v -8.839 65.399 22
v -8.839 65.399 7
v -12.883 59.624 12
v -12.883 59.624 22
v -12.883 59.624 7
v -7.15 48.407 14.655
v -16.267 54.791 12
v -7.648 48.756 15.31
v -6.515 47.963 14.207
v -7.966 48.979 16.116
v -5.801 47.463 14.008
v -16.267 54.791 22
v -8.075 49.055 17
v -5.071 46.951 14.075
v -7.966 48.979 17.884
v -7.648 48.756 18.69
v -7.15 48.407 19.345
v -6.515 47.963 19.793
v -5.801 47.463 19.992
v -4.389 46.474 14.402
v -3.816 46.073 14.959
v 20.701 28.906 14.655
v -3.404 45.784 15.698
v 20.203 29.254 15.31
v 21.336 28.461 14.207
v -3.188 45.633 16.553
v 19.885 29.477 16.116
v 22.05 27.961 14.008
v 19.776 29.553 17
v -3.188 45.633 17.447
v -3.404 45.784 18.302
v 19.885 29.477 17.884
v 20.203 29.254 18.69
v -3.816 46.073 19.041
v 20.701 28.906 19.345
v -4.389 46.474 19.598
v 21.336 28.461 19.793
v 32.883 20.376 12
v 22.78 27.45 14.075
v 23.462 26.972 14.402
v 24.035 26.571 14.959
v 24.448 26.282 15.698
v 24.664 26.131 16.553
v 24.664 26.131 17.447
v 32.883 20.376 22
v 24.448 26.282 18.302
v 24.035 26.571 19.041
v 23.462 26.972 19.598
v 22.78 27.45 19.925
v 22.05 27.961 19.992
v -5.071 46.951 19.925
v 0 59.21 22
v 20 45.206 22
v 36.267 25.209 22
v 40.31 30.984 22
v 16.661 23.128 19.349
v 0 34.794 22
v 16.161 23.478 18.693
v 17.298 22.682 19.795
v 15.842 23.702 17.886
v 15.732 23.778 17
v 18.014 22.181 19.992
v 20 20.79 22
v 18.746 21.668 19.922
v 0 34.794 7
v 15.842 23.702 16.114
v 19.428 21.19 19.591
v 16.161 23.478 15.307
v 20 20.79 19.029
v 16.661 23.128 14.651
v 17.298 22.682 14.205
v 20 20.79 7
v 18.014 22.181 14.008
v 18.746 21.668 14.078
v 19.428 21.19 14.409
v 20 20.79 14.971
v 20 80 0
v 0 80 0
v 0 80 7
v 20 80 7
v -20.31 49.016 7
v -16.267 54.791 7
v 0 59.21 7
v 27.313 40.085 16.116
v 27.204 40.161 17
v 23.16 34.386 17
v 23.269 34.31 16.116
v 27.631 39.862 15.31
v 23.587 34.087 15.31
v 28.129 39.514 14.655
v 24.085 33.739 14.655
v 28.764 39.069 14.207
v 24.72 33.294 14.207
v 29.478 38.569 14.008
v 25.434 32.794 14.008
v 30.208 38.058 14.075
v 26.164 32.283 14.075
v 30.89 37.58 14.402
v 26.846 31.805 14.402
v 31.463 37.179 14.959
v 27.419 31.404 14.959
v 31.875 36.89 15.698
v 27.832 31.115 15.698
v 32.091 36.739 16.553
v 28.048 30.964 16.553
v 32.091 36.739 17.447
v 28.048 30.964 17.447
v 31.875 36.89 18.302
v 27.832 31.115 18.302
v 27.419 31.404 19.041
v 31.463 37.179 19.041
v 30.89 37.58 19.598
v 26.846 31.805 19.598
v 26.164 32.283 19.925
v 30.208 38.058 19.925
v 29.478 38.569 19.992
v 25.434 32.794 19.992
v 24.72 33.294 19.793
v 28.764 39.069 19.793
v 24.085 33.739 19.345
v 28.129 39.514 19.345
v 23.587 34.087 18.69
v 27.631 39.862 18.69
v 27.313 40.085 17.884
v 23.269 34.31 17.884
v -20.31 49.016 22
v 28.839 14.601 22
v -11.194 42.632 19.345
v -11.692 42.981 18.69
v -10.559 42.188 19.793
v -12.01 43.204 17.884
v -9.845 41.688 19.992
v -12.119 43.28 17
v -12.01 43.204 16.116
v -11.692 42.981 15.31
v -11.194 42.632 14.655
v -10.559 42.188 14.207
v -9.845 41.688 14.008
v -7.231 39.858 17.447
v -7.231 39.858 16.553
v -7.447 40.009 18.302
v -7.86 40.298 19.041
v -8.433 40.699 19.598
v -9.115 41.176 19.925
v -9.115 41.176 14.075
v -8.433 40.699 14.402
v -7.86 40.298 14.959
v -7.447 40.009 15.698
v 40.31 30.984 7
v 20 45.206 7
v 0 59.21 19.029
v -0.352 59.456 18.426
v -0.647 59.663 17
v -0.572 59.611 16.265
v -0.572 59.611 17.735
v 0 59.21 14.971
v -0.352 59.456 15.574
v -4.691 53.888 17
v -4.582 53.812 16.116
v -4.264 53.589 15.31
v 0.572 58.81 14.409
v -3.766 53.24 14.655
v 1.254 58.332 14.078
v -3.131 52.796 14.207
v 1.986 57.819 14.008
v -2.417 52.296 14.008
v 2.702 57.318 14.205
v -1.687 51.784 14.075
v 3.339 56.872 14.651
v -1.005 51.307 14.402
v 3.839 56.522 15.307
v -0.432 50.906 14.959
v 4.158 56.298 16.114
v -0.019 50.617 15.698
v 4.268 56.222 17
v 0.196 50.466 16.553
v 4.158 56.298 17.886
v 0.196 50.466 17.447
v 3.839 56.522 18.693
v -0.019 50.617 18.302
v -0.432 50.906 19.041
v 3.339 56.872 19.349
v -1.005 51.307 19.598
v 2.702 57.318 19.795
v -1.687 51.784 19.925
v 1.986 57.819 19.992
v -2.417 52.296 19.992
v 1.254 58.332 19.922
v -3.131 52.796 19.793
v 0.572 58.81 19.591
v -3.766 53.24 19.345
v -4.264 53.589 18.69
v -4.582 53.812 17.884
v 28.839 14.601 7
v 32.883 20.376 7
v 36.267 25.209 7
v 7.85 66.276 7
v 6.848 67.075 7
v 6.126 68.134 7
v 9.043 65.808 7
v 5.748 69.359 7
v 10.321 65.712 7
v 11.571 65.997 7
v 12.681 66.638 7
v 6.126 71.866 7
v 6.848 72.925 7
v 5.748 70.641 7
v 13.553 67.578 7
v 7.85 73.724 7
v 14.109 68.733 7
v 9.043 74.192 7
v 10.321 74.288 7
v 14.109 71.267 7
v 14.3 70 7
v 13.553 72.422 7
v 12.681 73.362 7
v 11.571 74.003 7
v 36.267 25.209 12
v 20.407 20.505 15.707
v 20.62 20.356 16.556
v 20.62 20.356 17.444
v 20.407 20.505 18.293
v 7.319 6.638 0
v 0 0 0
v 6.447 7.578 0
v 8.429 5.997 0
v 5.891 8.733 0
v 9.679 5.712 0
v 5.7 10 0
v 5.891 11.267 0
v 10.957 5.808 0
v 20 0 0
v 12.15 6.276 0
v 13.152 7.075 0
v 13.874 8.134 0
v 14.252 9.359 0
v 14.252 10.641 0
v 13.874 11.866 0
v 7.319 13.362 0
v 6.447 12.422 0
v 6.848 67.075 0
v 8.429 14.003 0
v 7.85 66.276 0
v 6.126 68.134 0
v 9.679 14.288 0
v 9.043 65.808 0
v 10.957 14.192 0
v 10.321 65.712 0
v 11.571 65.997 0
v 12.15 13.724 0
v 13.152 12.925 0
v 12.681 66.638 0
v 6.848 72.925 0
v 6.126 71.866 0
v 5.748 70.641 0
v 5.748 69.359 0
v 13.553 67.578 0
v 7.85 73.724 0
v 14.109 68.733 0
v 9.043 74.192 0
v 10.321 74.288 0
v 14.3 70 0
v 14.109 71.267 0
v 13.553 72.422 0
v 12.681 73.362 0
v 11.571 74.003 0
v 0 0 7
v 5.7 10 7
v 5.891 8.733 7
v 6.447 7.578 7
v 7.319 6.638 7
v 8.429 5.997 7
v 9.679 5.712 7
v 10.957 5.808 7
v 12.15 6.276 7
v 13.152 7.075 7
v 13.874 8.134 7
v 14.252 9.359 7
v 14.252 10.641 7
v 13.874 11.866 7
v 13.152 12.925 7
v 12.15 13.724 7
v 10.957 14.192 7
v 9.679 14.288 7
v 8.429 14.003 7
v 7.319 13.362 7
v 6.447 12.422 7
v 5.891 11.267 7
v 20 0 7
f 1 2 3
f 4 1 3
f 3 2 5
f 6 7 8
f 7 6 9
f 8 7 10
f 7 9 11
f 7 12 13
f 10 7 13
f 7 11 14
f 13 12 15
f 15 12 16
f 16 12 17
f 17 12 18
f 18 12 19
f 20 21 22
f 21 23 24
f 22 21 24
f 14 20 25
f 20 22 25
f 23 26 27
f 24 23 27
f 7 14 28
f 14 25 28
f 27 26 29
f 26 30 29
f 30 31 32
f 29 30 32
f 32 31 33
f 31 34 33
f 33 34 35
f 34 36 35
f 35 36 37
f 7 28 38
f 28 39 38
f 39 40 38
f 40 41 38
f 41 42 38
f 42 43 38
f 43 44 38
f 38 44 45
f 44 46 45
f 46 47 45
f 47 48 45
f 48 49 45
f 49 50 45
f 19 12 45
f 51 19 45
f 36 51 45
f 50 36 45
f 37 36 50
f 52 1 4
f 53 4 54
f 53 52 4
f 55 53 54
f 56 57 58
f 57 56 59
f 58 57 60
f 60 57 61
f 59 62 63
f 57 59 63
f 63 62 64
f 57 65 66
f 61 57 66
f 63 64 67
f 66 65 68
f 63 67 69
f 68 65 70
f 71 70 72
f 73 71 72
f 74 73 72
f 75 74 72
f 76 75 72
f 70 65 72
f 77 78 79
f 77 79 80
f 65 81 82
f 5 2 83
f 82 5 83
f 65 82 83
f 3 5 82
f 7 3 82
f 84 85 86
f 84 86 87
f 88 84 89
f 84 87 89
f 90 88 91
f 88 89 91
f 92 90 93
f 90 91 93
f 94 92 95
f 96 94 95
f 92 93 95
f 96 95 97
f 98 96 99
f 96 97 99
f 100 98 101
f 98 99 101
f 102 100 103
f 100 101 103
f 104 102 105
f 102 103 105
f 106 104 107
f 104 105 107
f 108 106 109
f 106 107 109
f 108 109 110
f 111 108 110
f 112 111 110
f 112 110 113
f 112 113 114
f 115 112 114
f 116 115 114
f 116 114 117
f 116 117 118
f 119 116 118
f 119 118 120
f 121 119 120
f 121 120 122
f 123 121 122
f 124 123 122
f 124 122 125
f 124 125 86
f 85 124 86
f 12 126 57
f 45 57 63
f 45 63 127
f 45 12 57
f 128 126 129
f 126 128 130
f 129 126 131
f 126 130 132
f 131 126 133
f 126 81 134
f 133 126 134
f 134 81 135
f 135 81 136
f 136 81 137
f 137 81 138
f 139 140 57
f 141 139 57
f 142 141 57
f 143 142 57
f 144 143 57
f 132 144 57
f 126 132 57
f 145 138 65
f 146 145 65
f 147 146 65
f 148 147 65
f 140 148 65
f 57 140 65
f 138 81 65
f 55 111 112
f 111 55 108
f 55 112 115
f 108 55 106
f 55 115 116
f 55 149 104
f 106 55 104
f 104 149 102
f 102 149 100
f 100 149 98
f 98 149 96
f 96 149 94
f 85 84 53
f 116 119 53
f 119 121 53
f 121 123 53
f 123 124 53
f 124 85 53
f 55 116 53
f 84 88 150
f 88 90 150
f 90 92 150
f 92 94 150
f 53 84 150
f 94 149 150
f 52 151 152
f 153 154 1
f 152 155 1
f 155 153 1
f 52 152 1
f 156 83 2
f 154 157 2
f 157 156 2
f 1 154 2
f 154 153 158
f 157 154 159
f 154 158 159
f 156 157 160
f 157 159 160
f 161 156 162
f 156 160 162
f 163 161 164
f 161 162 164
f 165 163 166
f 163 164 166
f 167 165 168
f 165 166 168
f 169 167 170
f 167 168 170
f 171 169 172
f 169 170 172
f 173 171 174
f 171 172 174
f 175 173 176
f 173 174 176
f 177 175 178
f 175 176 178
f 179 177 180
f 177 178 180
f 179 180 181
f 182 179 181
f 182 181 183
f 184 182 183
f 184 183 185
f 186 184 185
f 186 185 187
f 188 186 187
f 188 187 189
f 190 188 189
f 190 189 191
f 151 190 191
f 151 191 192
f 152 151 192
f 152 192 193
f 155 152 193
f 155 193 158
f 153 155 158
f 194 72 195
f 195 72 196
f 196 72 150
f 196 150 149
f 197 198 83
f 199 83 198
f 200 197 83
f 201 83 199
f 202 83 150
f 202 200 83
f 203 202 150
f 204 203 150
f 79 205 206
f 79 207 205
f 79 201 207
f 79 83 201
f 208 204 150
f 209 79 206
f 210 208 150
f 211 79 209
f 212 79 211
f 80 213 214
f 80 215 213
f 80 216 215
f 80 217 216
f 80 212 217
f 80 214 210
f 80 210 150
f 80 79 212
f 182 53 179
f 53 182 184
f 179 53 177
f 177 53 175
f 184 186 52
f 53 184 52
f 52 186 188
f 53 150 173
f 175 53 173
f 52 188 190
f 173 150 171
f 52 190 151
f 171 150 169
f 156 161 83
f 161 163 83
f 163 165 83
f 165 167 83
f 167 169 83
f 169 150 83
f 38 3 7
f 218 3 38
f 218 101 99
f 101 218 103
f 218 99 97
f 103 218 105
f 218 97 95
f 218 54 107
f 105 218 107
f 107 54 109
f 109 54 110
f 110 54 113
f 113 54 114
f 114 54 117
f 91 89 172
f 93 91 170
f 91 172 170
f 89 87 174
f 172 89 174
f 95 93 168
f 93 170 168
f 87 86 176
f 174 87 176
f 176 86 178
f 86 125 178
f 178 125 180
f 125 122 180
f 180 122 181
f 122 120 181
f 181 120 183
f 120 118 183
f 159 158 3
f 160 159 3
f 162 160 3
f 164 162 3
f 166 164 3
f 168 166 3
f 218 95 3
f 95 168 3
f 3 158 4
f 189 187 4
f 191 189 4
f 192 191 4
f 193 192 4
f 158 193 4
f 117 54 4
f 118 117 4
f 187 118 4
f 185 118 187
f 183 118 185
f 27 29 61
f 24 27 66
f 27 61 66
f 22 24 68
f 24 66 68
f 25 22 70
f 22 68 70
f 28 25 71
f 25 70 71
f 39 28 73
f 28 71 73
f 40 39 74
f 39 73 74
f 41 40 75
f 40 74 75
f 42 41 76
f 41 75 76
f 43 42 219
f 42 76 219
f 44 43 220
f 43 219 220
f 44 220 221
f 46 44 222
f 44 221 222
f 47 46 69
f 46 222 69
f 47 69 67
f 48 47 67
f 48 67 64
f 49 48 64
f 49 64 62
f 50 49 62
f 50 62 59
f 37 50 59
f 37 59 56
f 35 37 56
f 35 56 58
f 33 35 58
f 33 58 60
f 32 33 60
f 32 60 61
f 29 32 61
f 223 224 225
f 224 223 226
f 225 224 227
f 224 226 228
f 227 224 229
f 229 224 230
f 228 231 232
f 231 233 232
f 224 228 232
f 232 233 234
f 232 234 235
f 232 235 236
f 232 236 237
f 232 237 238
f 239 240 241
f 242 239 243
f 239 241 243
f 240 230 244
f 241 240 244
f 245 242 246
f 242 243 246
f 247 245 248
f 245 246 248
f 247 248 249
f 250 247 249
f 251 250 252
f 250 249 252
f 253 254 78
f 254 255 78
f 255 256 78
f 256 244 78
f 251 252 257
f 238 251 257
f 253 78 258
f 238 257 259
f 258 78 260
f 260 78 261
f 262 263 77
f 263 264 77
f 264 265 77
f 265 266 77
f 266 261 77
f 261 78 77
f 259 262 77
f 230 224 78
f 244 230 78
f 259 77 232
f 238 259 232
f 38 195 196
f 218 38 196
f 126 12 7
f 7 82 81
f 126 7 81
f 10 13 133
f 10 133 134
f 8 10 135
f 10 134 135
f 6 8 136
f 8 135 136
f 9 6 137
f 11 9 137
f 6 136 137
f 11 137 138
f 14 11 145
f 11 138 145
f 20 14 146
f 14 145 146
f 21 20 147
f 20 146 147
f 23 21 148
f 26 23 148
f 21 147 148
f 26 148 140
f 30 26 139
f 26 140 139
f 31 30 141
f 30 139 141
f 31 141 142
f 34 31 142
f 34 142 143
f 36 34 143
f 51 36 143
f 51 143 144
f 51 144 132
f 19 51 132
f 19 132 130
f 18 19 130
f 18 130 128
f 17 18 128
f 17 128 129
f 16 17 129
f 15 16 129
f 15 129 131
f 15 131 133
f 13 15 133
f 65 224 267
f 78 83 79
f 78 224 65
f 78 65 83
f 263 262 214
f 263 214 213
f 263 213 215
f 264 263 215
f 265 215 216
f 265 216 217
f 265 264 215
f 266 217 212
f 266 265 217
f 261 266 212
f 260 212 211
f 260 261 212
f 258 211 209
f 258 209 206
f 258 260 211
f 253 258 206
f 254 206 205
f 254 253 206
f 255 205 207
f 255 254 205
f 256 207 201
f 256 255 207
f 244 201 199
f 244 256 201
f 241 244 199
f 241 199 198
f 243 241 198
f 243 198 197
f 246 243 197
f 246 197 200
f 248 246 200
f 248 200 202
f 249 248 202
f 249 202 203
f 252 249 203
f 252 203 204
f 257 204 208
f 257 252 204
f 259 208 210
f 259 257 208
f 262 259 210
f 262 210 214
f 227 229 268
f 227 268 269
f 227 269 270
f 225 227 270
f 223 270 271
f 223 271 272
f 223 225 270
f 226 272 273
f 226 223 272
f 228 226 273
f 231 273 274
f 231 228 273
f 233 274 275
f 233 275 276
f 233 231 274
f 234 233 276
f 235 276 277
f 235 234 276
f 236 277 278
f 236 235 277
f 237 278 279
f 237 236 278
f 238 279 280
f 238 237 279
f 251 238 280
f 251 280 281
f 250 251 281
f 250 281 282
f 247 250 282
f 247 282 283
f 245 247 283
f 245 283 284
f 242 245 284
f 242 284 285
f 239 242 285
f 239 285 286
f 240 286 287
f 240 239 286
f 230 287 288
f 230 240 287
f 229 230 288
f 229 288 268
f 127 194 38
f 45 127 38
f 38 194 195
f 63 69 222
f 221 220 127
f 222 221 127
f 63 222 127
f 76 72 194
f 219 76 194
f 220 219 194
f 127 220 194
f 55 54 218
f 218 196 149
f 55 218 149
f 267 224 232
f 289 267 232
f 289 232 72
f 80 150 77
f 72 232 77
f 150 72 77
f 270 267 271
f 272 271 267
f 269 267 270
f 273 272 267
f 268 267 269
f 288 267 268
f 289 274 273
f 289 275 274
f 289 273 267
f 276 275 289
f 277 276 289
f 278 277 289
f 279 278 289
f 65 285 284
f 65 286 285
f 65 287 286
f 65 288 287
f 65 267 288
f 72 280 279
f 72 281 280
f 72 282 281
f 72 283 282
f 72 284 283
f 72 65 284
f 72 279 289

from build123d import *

# Parameters (mm, degrees)
SKIZZE1_W                       = 20
SKIZZE1_H                       = 80
SKIZZE1_R                       = 4.3
AUFSATZ_LINEAR_AUSTRAGEN1_DEPTH = 7
AUFSATZ_LINEAR_AUSTRAGEN2_DEPTH = 15
SCHNITT_LINEAR_AUSTRAGEN1_DEPTH = 10
F_6_0_6_DURCHMESSER_BOHRUNG1_D  = 6


with BuildPart() as part:
    # Skizze1 → Aufsatz-Linear austragen1 (new body)
    with BuildSketch(Plane.XY):
        with Locations((10, 40)):
            Rectangle(SKIZZE1_W, SKIZZE1_H)
        with Locations((10, 70)):
            Circle(SKIZZE1_R, mode=Mode.SUBTRACT)
        with Locations(Location((10, 10, 0), (0, 0, 180))):  # turned: the seam where the file's is
            Circle(SKIZZE1_R, mode=Mode.SUBTRACT)
    extrude(amount=AUFSATZ_LINEAR_AUSTRAGEN1_DEPTH)

    # Skizze2 → Aufsatz-Linear austragen2 (add)
    with BuildSketch(Plane.XY.offset(7)):
        Polygon((32.882510841, 20.376208379), (20, 29.396639581), (20, 20.79017873), (28.838796965, 14.601186467), align=None)
        Polygon((36.266611816, 25.20920544), (20, 36.599209655), (20, 29.396639581), (32.882510841, 20.376208379), align=None)
        Polygon((40.310325692, 30.984227352), (20, 45.205670506), (20, 36.599209655), (36.266611816, 25.20920544), align=None)
        Polygon((20, 45.205670506), (0, 59.20982127), (0, 50.603360419), (20, 36.599209655), align=None)
        Polygon((20, 36.599209655), (0, 50.603360419), (0, 43.400790345), (20, 29.396639581), align=None)
        Polygon((20, 29.396639581), (0, 43.400790345), (0, 34.794329494), (20, 20.79017873), align=None)
        Polygon((0, 43.400790345), (-16.266611816, 54.79079456), (-20.310325692, 49.015772648), (0, 34.794329494), align=None)
        Polygon((0, 50.603360419), (-12.882510841, 59.623791621), (-16.266611816, 54.79079456), (0, 43.400790345), align=None)
        Polygon((0, 59.20982127), (-8.838796965, 65.398813533), (-12.882510841, 59.623791621), (0, 50.603360419), align=None)
    extrude(amount=AUFSATZ_LINEAR_AUSTRAGEN2_DEPTH)

    # Skizze3 → Schnitt-Linear austragen1 (cut)
    with BuildSketch(Plane.XY.offset(22)):
        Polygon((-16.266611816, 54.79079456), (32.882510841, 20.376208379), (36.266611816, 25.20920544), (-12.882510841, 59.623791621), align=None)
    extrude(amount=-SCHNITT_LINEAR_AUSTRAGEN1_DEPTH, mode=Mode.SUBTRACT)

    # Ø6.0 (6) Durchmesser Bohrung1 (through all)
    with Locations(Plane(origin=(27.819516063, 39.730386413, 0), x_dir=(0.819152044, -0.573576436, 0), z_dir=(0.573576436, 0.819152044, 0))):
        with Locations((2.248462989, -17), (-31.751537011, -17)):
            Hole(F_6_0_6_DURCHMESSER_BOHRUNG1_D / 2)


solid = part.part
